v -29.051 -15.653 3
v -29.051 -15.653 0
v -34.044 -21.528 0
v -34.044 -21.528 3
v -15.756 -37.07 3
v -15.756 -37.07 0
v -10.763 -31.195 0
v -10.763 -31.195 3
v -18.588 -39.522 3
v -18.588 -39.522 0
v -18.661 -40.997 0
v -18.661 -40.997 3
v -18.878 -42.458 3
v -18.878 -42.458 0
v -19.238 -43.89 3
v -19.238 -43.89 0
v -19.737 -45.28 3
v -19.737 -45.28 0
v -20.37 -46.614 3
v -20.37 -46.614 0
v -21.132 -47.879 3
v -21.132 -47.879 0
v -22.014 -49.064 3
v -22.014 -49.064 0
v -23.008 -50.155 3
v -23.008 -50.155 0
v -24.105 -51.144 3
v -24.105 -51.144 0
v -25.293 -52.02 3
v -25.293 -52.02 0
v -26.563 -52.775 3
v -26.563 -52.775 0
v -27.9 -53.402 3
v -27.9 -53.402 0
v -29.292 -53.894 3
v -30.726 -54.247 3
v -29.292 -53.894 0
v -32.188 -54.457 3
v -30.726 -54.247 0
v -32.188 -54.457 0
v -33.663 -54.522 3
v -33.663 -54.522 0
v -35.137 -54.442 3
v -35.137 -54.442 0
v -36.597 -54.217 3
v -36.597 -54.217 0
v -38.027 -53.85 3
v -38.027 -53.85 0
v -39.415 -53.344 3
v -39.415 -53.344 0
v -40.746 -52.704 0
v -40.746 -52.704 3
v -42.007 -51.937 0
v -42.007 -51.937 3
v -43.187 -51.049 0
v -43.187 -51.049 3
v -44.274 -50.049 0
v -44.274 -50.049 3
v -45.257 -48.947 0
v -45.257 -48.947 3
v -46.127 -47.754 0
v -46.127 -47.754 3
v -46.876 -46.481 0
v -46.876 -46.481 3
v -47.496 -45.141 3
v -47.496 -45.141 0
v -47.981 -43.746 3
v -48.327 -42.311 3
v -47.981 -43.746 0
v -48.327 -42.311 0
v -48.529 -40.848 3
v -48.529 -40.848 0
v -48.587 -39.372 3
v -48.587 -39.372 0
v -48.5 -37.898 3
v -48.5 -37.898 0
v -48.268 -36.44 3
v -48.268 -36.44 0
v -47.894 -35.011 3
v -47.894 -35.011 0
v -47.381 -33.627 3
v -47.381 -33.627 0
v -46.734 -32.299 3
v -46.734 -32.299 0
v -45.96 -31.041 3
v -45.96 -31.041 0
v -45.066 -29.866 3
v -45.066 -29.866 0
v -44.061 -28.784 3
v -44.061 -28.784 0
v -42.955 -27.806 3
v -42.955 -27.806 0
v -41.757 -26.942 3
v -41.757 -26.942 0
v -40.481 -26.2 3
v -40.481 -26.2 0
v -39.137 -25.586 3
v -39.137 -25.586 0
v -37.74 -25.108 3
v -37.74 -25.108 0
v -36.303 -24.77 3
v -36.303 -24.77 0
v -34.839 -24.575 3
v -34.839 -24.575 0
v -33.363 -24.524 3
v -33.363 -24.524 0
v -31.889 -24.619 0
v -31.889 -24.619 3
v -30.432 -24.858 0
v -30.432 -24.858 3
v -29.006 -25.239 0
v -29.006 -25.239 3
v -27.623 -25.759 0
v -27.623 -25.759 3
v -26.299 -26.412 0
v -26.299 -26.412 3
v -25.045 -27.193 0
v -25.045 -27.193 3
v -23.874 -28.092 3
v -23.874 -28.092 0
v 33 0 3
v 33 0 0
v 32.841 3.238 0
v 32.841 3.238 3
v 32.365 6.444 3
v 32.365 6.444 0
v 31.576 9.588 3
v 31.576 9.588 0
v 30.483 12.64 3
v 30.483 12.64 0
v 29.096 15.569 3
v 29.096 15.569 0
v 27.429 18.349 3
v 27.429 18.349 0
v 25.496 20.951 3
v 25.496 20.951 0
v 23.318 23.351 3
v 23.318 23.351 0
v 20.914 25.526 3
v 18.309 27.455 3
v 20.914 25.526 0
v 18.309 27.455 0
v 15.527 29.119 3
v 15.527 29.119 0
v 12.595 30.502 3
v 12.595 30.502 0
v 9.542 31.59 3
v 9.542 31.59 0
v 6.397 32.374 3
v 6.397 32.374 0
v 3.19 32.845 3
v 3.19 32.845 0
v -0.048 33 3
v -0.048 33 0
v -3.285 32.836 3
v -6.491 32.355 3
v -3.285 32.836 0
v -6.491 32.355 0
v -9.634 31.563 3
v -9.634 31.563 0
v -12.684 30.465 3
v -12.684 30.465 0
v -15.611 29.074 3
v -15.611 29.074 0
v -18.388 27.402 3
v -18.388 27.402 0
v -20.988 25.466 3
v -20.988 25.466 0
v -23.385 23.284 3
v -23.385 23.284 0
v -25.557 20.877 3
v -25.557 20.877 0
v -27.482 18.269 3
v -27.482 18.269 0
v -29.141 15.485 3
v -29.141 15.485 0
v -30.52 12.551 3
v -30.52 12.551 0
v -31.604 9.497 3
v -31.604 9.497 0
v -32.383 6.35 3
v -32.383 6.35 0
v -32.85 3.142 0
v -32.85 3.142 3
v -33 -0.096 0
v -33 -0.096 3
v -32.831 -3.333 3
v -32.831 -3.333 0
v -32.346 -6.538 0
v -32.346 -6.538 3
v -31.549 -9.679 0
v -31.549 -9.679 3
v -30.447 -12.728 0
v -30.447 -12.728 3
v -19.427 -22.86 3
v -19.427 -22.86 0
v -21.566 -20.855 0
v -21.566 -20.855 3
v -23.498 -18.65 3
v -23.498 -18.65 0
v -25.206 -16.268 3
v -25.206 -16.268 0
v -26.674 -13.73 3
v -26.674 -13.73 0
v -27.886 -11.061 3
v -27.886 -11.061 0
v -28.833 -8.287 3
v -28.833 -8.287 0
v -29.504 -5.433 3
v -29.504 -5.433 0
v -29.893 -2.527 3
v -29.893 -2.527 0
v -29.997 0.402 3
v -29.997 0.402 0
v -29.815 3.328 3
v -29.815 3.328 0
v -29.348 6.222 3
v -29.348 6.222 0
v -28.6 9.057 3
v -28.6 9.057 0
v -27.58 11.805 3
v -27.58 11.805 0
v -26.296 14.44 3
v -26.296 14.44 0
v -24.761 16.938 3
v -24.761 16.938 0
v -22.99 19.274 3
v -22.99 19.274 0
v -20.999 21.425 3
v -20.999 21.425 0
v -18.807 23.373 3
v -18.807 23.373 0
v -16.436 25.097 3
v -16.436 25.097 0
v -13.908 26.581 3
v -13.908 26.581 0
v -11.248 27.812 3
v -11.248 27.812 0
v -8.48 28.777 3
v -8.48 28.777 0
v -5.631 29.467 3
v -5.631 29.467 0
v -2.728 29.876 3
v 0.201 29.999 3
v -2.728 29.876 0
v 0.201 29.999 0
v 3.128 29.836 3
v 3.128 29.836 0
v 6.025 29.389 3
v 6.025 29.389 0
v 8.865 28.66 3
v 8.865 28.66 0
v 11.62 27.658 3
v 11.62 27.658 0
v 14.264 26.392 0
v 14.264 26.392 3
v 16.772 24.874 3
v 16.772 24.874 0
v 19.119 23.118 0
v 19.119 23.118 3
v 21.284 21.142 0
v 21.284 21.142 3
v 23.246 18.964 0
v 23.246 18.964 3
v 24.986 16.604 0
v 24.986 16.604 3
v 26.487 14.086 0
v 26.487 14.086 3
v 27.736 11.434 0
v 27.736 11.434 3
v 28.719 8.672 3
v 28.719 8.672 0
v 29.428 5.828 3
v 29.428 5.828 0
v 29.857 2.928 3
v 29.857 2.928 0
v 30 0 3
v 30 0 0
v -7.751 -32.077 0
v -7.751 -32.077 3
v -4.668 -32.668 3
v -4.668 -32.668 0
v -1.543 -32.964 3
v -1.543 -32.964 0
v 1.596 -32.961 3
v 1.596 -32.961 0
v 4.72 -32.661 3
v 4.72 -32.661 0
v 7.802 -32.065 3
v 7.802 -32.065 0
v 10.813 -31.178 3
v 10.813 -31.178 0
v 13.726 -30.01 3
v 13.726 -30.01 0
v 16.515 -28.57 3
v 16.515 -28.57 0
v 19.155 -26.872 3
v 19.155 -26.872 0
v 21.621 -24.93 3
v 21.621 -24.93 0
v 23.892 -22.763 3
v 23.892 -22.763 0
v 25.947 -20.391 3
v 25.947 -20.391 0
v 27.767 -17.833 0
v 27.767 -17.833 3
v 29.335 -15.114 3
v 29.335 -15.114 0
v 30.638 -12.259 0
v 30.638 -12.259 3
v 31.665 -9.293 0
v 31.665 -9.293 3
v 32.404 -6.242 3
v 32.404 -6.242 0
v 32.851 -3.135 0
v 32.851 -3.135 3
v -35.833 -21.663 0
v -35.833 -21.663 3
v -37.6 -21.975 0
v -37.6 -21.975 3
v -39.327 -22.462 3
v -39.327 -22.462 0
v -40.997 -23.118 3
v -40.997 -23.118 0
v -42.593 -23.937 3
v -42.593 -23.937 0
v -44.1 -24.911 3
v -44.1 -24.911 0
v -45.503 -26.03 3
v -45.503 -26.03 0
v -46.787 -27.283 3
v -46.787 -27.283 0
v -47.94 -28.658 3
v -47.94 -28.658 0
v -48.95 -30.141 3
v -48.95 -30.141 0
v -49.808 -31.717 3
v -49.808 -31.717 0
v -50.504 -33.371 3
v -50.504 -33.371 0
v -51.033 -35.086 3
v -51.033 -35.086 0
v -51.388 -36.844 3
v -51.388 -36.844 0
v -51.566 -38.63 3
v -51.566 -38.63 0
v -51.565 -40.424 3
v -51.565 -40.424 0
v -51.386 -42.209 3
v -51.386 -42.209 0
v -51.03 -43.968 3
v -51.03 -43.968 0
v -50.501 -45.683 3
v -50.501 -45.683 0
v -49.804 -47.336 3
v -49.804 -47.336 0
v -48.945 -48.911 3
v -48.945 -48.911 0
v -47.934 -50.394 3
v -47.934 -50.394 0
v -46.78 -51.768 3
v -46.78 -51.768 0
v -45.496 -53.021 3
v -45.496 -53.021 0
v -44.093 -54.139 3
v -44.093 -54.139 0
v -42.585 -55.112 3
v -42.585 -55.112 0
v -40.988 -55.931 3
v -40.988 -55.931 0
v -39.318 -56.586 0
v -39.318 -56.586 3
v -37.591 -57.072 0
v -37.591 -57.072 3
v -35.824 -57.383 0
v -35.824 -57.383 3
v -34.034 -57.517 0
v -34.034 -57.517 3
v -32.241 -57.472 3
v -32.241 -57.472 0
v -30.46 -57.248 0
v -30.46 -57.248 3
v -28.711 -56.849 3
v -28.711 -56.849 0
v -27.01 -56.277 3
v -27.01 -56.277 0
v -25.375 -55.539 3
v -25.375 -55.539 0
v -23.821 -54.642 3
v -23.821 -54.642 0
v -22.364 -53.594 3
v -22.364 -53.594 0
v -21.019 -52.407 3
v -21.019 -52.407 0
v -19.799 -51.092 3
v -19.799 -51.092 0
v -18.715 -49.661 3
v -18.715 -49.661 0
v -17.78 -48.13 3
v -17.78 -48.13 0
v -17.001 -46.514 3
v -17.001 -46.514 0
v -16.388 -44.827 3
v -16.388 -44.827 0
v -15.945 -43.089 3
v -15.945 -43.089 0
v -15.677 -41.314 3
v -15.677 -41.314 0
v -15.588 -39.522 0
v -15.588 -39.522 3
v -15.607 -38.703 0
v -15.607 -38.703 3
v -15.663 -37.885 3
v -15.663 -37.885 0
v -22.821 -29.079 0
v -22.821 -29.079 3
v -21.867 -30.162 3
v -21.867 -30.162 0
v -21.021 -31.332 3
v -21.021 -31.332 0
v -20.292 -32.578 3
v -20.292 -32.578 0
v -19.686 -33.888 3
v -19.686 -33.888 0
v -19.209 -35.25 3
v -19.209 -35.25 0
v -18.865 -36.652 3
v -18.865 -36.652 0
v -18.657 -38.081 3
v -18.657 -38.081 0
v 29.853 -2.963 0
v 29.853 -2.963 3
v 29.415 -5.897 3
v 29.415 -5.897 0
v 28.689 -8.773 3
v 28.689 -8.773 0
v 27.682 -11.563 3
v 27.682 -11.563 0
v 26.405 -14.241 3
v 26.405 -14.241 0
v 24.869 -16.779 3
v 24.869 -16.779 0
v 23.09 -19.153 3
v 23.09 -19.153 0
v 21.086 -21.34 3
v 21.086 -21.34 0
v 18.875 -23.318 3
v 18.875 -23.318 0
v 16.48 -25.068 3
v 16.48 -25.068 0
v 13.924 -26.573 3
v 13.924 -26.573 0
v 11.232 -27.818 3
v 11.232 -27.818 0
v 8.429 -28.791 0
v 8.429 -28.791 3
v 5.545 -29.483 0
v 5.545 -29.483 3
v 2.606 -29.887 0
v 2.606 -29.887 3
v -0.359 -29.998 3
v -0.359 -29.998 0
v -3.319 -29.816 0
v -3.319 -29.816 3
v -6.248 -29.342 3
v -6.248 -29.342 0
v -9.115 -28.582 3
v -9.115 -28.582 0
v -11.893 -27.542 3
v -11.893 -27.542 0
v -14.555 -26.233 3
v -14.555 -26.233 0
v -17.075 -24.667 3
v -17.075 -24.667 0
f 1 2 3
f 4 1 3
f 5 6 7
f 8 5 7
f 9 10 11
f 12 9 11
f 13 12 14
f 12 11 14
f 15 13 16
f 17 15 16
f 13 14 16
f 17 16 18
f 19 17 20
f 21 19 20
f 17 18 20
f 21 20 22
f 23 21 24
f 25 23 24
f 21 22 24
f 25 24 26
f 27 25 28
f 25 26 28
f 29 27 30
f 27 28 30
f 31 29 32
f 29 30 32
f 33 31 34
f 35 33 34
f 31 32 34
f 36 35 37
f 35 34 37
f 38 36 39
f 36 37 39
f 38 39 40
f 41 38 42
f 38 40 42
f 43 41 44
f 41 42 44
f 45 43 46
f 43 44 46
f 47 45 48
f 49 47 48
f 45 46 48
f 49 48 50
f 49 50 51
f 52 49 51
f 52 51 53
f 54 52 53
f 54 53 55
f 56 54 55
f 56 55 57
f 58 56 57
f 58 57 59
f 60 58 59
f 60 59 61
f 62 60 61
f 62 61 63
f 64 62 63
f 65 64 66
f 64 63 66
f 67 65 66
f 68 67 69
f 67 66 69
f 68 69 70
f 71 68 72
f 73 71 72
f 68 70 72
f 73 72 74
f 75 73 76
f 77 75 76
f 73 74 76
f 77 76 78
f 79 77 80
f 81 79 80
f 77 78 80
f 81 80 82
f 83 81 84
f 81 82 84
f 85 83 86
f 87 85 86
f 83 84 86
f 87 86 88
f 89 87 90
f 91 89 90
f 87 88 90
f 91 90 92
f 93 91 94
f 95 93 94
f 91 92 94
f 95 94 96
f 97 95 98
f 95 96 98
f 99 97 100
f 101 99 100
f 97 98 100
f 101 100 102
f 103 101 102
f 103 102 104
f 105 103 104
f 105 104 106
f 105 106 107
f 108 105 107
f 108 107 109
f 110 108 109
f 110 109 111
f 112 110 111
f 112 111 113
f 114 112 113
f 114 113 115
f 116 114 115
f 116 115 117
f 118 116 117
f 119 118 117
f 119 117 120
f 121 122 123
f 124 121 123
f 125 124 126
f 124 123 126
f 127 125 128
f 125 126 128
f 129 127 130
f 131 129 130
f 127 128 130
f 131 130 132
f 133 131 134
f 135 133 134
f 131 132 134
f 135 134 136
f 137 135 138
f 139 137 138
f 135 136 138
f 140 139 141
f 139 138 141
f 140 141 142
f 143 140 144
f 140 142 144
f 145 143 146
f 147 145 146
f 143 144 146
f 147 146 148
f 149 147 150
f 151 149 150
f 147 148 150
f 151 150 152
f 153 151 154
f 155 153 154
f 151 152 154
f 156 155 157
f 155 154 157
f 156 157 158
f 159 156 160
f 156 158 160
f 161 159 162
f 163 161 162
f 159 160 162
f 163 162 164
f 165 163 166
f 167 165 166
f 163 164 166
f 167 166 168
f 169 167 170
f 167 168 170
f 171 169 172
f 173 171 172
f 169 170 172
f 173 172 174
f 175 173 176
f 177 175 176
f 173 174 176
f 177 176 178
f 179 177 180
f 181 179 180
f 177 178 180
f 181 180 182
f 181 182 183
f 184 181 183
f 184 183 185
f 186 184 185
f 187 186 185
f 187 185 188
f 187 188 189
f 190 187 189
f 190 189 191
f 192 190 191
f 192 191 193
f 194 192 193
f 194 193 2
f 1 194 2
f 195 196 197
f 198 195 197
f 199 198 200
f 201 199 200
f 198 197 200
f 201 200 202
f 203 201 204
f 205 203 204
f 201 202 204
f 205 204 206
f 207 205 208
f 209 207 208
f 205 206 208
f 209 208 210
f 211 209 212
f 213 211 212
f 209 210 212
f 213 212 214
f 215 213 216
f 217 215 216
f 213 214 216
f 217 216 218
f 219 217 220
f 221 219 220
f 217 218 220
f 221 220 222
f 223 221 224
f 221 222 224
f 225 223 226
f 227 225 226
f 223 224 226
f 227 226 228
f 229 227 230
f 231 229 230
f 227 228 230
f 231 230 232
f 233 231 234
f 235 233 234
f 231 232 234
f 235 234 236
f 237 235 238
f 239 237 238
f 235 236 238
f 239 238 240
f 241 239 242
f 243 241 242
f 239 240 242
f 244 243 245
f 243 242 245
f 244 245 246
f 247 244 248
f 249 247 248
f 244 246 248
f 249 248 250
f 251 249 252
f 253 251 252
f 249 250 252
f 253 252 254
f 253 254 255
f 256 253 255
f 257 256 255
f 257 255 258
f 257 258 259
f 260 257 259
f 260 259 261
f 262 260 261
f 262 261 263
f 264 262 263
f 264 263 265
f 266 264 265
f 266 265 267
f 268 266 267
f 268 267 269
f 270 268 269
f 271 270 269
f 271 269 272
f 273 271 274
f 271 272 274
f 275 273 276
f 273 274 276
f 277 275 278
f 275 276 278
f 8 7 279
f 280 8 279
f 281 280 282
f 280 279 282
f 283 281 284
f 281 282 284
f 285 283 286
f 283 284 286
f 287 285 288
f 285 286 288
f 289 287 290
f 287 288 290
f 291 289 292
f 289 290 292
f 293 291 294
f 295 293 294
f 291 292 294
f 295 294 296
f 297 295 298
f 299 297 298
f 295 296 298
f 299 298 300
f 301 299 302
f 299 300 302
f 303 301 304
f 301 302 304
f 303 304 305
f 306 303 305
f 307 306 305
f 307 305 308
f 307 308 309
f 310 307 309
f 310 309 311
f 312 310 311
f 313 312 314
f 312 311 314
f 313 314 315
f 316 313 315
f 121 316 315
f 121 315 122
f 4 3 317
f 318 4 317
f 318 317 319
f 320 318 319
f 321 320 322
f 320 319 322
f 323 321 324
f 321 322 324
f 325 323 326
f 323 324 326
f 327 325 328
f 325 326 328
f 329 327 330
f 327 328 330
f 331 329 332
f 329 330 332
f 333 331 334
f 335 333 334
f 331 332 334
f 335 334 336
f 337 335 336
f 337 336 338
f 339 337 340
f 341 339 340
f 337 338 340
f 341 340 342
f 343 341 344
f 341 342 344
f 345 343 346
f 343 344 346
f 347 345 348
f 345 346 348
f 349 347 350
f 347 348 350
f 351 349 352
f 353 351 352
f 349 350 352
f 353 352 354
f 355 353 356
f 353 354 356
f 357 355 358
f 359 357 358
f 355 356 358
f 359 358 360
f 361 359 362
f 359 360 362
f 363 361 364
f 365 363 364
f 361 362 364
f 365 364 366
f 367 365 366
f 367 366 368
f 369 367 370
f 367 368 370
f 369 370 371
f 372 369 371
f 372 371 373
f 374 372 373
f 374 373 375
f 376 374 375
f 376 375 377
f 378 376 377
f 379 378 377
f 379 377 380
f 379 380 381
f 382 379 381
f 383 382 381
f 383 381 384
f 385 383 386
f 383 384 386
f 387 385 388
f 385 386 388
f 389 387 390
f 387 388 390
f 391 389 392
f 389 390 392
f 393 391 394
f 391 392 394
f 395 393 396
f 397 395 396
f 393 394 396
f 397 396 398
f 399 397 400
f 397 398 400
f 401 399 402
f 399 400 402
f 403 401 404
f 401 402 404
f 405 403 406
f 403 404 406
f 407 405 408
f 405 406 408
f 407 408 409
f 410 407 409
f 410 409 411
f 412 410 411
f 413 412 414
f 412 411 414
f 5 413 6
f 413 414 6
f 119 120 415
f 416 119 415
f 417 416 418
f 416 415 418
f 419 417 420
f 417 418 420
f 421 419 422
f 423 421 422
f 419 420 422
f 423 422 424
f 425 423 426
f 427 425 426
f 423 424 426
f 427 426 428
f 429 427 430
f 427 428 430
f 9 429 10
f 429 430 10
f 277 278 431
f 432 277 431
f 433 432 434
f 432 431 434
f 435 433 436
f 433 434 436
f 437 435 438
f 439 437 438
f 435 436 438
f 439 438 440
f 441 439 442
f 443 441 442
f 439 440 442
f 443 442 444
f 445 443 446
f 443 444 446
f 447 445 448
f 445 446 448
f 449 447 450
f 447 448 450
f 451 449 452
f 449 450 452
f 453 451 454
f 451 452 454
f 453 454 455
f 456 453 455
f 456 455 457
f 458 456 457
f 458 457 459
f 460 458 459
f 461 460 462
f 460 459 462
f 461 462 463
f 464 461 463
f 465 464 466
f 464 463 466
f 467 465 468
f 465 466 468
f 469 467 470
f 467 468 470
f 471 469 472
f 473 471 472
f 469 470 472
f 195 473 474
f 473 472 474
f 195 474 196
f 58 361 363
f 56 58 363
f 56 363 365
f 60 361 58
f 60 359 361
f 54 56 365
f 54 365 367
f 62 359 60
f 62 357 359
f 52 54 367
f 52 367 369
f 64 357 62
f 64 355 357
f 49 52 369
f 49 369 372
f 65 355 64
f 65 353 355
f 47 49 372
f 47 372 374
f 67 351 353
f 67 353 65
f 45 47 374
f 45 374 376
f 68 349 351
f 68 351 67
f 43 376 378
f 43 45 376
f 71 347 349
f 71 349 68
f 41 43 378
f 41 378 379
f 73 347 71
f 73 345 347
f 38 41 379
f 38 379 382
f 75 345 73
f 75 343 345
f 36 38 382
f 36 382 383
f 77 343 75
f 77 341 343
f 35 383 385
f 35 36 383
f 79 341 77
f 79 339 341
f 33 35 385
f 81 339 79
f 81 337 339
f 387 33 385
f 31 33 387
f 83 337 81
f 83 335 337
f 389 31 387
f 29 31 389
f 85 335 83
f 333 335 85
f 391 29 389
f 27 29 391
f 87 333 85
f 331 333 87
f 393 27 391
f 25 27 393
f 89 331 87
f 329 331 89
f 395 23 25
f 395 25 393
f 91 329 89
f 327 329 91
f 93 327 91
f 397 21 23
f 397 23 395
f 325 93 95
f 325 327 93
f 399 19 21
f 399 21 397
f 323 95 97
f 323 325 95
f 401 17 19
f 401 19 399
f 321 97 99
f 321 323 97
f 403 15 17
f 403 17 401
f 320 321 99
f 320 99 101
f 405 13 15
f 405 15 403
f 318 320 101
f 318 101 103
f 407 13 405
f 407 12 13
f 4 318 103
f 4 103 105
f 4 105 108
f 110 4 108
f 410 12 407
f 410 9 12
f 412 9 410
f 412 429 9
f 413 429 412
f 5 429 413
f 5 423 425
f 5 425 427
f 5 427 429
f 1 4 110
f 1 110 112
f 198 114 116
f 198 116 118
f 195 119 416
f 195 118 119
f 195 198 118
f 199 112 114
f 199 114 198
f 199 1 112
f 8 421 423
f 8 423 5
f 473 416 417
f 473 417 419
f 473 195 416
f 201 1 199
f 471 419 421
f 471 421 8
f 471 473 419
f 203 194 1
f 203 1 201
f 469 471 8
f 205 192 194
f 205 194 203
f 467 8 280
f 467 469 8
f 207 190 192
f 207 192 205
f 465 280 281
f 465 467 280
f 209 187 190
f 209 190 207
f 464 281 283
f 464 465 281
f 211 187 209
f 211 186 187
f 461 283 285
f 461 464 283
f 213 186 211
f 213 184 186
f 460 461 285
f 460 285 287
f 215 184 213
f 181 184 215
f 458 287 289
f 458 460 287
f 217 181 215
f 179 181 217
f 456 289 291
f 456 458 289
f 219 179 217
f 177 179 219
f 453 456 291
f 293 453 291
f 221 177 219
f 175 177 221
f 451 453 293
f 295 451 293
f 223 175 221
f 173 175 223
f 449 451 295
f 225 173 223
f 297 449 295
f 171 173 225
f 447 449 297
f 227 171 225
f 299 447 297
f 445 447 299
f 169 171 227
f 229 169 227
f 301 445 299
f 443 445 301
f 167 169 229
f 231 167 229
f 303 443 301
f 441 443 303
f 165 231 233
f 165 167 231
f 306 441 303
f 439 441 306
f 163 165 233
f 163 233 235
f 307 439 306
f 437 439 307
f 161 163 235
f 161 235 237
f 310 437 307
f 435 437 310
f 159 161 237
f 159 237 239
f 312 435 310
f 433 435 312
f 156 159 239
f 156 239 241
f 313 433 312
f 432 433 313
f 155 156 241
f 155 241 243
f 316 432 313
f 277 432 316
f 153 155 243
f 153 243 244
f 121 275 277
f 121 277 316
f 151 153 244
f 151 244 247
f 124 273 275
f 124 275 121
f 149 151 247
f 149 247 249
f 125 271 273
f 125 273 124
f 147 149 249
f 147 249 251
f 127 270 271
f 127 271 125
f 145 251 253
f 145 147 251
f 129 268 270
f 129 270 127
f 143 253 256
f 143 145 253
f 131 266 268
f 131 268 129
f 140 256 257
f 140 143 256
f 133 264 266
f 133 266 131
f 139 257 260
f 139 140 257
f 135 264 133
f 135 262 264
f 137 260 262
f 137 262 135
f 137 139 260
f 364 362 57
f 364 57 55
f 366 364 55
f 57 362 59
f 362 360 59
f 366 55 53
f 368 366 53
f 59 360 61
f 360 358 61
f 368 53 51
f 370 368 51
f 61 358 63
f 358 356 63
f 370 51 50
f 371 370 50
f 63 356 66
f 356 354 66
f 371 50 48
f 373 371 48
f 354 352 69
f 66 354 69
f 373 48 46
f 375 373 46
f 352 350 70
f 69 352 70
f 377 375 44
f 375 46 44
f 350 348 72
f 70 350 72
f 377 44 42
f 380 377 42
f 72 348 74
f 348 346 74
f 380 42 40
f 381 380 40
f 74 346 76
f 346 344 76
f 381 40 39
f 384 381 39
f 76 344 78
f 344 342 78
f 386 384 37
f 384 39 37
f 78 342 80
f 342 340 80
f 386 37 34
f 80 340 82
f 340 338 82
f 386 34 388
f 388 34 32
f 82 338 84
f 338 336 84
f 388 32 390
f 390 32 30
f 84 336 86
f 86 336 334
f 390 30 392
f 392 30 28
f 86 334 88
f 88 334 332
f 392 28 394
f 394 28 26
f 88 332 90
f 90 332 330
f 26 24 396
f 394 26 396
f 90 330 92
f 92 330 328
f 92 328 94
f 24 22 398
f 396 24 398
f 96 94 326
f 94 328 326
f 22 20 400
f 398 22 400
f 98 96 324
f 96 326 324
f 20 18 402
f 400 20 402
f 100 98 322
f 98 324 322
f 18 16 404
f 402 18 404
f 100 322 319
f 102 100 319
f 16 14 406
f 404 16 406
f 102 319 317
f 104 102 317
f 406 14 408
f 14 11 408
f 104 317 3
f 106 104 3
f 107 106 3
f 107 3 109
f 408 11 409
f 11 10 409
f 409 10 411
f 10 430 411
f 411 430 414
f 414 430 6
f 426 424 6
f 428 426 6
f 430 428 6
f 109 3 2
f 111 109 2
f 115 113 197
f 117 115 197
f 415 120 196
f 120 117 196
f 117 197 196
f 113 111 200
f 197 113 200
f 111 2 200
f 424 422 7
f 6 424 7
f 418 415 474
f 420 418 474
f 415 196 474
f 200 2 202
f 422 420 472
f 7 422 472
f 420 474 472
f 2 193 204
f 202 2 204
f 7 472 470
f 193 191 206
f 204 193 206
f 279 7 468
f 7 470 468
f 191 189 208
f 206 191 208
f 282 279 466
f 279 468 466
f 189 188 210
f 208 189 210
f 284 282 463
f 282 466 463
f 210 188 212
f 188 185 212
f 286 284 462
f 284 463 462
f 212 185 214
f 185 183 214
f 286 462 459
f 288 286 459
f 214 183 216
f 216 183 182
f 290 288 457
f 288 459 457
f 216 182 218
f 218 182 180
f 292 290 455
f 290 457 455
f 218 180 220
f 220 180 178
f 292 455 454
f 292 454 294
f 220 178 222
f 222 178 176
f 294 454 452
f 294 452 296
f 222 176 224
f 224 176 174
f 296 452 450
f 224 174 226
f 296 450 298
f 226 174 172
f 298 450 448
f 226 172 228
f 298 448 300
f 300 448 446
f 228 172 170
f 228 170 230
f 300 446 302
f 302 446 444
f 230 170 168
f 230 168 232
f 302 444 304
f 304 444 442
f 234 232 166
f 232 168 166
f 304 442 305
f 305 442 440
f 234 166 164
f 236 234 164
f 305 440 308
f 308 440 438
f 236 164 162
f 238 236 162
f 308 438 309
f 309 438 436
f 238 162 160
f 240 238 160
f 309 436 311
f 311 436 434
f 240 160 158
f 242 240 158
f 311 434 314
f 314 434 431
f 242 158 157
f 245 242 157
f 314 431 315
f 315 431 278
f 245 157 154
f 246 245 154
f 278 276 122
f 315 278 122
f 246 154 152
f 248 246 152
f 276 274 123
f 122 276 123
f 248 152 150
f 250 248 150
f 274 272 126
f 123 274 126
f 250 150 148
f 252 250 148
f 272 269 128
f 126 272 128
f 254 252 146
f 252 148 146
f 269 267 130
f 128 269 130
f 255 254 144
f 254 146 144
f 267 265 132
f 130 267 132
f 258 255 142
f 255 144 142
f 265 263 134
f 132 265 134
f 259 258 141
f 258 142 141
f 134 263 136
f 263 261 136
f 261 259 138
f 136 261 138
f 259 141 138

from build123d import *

# Parameters (mm, degrees)
F1_DEPTH = 3


with BuildPart() as f1:
    # F0 (on Top) → F1 (new body)
    with BuildSketch(Plane.XY):
        with BuildLine():
            ThreePointArc((-15.755804, -37.070002), (-17.804677, -30.868516), (-21.931504, -25.806342))
            ThreePointArc((-21.931504, -25.806342), (-27.592968, -22.549942), (-34.043707, -21.528038))
            ThreePointArc((-34.043707, -21.528038), (-46.153741, -52.410308), (-15.587977, -39.522268))
            ThreePointArc((-15.587977, -39.522268), (-15.629983, -38.293267), (-15.755804, -37.070002))
        make_face()
        with BuildLine():
            ThreePointArc((-18.587977, -39.522268), (-47.202416, -45.818858), (-23.87425, -28.092329))
            ThreePointArc((-23.87425, -28.092329), (-19.973538, -33.225678), (-18.587977, -39.522268))
        make_face(mode=Mode.SUBTRACT)
        with BuildLine():
            ThreePointArc((-29.051168, -15.653423), (-25.653561, -20.758006), (-21.3702, -25.145866))
            ThreePointArc((-21.3702, -25.145866), (-16.348978, -28.665501), (-10.763265, -31.195386))
            ThreePointArc((-10.763265, -31.195386), (19.154794, -26.871805), (33, 0))
            ThreePointArc((33, 0), (-8.07191, 31.997567), (-29.051168, -15.653423))
        make_face()
        with BuildLine():
            ThreePointArc((-19.427454, -22.859878), (-12.59318, 27.228878), (30, 0))
            ThreePointArc((30, 0), (12.59318, -27.228878), (-19.427454, -22.859878))
        make_face(mode=Mode.SUBTRACT)
        with BuildLine():
            ThreePointArc((-10.763265, -31.195386), (-16.348978, -28.665501), (-21.3702, -25.145866))
            Line((-21.3702, -25.145866), (-21.931504, -25.806342))
            ThreePointArc((-21.931504, -25.806342), (-17.804677, -30.868516), (-15.755804, -37.070002))
            Line((-15.755804, -37.070002), (-10.763265, -31.195386))
        make_face()
        with BuildLine():
            Line((-21.931504, -25.806342), (-21.3702, -25.145866))
            ThreePointArc((-21.3702, -25.145866), (-25.653561, -20.758006), (-29.051168, -15.653423))
            Line((-29.051168, -15.653423), (-34.043707, -21.528038))
            ThreePointArc((-34.043707, -21.528038), (-27.592968, -22.549942), (-21.931504, -25.806342))
        make_face()
    extrude(amount=F1_DEPTH)


solid = f1.part
